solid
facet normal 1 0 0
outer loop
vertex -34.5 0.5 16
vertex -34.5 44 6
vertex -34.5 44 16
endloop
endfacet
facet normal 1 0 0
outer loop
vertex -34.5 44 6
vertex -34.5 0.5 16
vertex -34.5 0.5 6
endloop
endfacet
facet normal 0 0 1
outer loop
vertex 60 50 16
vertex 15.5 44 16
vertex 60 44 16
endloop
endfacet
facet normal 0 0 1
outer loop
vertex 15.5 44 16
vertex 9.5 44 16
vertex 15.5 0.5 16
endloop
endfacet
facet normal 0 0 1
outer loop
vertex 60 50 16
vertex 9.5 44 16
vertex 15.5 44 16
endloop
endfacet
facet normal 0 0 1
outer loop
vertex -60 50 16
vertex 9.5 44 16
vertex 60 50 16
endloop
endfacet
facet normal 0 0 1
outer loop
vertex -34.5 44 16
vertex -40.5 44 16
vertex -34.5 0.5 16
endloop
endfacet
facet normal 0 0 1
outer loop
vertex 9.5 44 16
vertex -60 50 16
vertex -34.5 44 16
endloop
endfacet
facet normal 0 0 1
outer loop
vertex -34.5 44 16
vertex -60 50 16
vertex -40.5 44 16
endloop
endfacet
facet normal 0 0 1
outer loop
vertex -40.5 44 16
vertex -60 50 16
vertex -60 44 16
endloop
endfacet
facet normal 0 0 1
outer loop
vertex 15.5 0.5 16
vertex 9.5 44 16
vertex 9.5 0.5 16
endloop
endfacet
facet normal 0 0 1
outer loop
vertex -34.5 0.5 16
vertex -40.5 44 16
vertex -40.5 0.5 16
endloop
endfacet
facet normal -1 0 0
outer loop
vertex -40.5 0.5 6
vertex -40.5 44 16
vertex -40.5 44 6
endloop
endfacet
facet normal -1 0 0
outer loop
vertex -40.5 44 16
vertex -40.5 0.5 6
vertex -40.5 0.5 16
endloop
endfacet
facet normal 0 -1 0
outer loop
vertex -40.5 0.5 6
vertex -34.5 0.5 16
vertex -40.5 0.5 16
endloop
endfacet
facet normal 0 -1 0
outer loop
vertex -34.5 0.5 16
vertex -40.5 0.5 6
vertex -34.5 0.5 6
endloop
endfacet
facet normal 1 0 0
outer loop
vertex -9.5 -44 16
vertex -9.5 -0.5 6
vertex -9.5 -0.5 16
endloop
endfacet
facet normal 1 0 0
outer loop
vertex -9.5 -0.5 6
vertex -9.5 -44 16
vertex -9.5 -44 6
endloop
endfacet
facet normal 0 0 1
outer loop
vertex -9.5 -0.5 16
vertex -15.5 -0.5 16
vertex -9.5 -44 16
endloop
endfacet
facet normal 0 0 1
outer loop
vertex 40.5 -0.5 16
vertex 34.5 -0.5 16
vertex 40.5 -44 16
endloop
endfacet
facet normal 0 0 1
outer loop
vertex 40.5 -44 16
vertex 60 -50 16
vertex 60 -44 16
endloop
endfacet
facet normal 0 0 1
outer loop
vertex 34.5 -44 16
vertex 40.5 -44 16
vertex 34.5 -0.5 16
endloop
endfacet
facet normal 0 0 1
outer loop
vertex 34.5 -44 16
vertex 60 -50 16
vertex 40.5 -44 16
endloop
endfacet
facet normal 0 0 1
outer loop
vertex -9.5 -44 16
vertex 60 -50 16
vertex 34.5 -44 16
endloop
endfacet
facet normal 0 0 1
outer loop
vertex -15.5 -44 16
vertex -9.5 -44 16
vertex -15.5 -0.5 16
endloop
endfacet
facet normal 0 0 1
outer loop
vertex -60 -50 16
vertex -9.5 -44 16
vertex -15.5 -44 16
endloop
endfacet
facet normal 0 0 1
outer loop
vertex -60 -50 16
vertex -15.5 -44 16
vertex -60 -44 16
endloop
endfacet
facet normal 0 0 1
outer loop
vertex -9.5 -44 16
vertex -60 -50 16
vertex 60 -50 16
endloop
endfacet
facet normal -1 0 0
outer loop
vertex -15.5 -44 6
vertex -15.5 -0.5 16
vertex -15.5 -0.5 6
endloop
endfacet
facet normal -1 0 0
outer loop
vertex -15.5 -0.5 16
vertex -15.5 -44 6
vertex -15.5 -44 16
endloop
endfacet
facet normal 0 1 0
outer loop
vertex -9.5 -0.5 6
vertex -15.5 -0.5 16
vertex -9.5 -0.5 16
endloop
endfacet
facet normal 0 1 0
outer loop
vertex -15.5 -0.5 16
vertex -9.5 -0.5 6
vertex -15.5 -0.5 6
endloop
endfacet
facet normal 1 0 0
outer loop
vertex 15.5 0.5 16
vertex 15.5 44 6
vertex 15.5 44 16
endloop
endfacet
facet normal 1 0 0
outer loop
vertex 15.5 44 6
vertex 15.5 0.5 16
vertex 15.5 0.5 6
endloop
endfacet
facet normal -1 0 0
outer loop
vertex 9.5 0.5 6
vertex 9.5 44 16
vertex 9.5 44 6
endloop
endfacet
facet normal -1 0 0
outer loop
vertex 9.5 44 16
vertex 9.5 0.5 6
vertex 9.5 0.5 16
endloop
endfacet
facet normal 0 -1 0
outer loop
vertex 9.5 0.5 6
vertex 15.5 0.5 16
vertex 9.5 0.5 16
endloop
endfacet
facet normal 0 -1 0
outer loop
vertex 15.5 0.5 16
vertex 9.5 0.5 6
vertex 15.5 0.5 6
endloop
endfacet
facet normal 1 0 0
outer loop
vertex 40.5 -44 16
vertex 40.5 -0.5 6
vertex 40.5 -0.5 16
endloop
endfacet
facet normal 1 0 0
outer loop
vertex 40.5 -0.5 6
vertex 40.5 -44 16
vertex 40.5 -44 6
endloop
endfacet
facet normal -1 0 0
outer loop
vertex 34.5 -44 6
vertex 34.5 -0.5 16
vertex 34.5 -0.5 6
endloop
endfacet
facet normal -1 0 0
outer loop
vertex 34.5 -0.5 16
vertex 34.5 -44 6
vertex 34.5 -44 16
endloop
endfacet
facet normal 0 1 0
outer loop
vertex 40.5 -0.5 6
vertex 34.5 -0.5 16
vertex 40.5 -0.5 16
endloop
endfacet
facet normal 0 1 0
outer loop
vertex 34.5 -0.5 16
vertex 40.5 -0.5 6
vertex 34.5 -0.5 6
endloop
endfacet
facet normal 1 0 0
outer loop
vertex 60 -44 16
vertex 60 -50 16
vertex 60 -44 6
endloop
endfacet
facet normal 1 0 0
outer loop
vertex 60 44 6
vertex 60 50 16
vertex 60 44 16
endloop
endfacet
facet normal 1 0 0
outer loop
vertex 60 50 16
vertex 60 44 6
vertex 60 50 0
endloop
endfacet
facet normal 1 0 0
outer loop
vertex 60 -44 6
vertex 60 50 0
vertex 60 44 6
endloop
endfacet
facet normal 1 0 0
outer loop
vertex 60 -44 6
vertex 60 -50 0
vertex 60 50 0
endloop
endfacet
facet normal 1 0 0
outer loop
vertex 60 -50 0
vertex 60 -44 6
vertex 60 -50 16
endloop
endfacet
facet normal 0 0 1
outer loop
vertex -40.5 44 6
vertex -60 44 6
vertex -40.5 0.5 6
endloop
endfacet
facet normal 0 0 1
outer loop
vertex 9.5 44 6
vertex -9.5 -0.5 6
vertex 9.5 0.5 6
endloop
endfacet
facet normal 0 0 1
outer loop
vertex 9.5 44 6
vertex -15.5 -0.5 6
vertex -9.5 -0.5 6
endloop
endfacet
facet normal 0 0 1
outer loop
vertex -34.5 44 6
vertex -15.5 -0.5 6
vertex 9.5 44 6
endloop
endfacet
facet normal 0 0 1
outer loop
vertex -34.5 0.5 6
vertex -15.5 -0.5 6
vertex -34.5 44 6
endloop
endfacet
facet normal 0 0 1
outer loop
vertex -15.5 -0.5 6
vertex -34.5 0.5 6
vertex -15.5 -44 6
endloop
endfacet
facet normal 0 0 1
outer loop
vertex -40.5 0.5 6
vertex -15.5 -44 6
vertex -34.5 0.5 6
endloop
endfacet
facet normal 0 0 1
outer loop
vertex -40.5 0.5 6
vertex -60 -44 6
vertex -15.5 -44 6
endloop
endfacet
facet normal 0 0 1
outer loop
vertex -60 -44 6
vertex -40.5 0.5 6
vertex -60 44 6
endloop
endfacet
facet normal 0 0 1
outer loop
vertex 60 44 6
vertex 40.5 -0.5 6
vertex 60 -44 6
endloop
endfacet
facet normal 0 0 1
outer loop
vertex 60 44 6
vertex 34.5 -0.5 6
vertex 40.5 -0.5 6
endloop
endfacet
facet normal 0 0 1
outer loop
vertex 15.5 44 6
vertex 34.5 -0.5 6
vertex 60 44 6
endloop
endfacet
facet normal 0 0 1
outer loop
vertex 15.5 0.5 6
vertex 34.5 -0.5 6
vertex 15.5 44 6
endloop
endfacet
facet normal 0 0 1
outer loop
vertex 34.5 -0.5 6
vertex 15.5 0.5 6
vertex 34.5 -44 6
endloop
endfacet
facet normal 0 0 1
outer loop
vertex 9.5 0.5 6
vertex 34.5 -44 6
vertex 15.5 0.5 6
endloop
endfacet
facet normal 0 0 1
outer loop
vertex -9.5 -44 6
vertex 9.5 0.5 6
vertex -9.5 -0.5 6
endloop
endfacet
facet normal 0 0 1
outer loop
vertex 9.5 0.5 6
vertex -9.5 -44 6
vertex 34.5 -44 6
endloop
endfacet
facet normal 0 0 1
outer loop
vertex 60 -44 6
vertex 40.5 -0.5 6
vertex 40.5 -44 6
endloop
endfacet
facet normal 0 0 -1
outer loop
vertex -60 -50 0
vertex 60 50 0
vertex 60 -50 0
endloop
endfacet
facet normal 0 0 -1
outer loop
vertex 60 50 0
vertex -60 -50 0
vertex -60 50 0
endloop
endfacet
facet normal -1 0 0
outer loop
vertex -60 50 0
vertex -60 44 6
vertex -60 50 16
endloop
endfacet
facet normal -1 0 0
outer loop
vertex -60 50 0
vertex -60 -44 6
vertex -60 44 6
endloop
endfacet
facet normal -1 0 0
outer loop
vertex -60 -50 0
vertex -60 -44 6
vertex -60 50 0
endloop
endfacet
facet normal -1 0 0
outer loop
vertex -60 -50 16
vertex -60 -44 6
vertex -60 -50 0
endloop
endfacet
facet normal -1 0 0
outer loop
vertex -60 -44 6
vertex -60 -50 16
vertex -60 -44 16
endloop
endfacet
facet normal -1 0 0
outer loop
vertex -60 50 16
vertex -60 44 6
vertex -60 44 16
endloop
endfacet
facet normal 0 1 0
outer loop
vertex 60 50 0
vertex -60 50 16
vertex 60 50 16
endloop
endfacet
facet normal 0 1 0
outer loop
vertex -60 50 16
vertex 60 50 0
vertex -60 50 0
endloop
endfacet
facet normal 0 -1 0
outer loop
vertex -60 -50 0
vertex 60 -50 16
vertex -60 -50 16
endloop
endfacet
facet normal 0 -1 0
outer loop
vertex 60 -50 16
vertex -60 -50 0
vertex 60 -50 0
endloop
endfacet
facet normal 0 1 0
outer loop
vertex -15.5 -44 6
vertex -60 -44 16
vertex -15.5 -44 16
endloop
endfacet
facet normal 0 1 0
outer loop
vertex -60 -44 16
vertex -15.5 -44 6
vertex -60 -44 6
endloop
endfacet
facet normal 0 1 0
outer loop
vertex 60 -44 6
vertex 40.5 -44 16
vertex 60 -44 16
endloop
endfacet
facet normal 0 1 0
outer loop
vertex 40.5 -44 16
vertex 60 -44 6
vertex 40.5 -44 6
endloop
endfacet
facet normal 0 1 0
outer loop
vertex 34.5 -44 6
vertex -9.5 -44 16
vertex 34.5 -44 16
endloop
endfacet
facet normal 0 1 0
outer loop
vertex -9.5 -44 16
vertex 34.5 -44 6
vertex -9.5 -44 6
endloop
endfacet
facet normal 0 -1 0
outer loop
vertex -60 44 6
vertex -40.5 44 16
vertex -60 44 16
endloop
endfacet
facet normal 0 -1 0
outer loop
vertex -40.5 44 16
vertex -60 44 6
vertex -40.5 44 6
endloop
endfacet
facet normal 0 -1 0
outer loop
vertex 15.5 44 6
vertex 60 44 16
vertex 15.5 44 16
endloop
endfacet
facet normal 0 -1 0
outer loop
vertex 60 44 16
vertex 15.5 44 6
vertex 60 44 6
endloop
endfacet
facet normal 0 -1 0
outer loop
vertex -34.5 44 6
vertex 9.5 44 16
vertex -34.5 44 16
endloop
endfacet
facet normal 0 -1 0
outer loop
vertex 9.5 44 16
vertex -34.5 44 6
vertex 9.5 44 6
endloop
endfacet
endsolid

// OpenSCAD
$fn = 32;

// ----------------------------------------------------------------------
// Rib frame 120 x 100 x 16
// 4 ribs at 25 mm pitch, staggered
// ----------------------------------------------------------------------

// --- parameters (mm) ---
frame = [120, 100, 6];  // base plate size (x, y, z)
rail_w = 6;             // side rail width
ribs = 4;               // number of ribs
rib_t = 6;              // rib thickness
rib_h = 10;             // rib height above the base plate
pitch = 25;             // pitch between rib centres

// --- derived feature positions (mm) ---
span = (ribs - 1) * pitch;          // = 75   distance between the outer ribs
origin_x = -span / 2;               // = -37.5   X of the first rib
rib_len = frame[1] / 2 - rail_w + 0.5;  // = 44.5   length of a staggered rib
rib_y = 0.5 + rib_len / 2;          // = 22.75   Y of a staggered rib centre
row_offset = 2 * rib_y;             // = 45.5   distance between the two rows
feature_centers = [
  [origin_x + 0 * pitch, rib_y],
  [origin_x + 1 * pitch, -rib_y],
  [origin_x + 2 * pitch, rib_y],
  [origin_x + 3 * pitch, -rib_y]
];   // rib centre line, drives the rib loop

// base plate, two side rails, then the ribs read straight off feature_centers
union() {
  translate([-frame[0] / 2, -frame[1] / 2, 0]) cube(frame);
  translate([-frame[0] / 2, -frame[1] / 2, 0]) cube([frame[0], rail_w, frame[2] + rib_h]);
  translate([-frame[0] / 2, frame[1] / 2 - rail_w, 0]) cube([frame[0], rail_w, frame[2] + rib_h]);
  for (centre = feature_centers)
    translate([centre[0] - rib_t / 2, centre[1] - rib_len / 2, frame[2] - 1])
      cube([rib_t, rib_len, rib_h + 1]);
}
